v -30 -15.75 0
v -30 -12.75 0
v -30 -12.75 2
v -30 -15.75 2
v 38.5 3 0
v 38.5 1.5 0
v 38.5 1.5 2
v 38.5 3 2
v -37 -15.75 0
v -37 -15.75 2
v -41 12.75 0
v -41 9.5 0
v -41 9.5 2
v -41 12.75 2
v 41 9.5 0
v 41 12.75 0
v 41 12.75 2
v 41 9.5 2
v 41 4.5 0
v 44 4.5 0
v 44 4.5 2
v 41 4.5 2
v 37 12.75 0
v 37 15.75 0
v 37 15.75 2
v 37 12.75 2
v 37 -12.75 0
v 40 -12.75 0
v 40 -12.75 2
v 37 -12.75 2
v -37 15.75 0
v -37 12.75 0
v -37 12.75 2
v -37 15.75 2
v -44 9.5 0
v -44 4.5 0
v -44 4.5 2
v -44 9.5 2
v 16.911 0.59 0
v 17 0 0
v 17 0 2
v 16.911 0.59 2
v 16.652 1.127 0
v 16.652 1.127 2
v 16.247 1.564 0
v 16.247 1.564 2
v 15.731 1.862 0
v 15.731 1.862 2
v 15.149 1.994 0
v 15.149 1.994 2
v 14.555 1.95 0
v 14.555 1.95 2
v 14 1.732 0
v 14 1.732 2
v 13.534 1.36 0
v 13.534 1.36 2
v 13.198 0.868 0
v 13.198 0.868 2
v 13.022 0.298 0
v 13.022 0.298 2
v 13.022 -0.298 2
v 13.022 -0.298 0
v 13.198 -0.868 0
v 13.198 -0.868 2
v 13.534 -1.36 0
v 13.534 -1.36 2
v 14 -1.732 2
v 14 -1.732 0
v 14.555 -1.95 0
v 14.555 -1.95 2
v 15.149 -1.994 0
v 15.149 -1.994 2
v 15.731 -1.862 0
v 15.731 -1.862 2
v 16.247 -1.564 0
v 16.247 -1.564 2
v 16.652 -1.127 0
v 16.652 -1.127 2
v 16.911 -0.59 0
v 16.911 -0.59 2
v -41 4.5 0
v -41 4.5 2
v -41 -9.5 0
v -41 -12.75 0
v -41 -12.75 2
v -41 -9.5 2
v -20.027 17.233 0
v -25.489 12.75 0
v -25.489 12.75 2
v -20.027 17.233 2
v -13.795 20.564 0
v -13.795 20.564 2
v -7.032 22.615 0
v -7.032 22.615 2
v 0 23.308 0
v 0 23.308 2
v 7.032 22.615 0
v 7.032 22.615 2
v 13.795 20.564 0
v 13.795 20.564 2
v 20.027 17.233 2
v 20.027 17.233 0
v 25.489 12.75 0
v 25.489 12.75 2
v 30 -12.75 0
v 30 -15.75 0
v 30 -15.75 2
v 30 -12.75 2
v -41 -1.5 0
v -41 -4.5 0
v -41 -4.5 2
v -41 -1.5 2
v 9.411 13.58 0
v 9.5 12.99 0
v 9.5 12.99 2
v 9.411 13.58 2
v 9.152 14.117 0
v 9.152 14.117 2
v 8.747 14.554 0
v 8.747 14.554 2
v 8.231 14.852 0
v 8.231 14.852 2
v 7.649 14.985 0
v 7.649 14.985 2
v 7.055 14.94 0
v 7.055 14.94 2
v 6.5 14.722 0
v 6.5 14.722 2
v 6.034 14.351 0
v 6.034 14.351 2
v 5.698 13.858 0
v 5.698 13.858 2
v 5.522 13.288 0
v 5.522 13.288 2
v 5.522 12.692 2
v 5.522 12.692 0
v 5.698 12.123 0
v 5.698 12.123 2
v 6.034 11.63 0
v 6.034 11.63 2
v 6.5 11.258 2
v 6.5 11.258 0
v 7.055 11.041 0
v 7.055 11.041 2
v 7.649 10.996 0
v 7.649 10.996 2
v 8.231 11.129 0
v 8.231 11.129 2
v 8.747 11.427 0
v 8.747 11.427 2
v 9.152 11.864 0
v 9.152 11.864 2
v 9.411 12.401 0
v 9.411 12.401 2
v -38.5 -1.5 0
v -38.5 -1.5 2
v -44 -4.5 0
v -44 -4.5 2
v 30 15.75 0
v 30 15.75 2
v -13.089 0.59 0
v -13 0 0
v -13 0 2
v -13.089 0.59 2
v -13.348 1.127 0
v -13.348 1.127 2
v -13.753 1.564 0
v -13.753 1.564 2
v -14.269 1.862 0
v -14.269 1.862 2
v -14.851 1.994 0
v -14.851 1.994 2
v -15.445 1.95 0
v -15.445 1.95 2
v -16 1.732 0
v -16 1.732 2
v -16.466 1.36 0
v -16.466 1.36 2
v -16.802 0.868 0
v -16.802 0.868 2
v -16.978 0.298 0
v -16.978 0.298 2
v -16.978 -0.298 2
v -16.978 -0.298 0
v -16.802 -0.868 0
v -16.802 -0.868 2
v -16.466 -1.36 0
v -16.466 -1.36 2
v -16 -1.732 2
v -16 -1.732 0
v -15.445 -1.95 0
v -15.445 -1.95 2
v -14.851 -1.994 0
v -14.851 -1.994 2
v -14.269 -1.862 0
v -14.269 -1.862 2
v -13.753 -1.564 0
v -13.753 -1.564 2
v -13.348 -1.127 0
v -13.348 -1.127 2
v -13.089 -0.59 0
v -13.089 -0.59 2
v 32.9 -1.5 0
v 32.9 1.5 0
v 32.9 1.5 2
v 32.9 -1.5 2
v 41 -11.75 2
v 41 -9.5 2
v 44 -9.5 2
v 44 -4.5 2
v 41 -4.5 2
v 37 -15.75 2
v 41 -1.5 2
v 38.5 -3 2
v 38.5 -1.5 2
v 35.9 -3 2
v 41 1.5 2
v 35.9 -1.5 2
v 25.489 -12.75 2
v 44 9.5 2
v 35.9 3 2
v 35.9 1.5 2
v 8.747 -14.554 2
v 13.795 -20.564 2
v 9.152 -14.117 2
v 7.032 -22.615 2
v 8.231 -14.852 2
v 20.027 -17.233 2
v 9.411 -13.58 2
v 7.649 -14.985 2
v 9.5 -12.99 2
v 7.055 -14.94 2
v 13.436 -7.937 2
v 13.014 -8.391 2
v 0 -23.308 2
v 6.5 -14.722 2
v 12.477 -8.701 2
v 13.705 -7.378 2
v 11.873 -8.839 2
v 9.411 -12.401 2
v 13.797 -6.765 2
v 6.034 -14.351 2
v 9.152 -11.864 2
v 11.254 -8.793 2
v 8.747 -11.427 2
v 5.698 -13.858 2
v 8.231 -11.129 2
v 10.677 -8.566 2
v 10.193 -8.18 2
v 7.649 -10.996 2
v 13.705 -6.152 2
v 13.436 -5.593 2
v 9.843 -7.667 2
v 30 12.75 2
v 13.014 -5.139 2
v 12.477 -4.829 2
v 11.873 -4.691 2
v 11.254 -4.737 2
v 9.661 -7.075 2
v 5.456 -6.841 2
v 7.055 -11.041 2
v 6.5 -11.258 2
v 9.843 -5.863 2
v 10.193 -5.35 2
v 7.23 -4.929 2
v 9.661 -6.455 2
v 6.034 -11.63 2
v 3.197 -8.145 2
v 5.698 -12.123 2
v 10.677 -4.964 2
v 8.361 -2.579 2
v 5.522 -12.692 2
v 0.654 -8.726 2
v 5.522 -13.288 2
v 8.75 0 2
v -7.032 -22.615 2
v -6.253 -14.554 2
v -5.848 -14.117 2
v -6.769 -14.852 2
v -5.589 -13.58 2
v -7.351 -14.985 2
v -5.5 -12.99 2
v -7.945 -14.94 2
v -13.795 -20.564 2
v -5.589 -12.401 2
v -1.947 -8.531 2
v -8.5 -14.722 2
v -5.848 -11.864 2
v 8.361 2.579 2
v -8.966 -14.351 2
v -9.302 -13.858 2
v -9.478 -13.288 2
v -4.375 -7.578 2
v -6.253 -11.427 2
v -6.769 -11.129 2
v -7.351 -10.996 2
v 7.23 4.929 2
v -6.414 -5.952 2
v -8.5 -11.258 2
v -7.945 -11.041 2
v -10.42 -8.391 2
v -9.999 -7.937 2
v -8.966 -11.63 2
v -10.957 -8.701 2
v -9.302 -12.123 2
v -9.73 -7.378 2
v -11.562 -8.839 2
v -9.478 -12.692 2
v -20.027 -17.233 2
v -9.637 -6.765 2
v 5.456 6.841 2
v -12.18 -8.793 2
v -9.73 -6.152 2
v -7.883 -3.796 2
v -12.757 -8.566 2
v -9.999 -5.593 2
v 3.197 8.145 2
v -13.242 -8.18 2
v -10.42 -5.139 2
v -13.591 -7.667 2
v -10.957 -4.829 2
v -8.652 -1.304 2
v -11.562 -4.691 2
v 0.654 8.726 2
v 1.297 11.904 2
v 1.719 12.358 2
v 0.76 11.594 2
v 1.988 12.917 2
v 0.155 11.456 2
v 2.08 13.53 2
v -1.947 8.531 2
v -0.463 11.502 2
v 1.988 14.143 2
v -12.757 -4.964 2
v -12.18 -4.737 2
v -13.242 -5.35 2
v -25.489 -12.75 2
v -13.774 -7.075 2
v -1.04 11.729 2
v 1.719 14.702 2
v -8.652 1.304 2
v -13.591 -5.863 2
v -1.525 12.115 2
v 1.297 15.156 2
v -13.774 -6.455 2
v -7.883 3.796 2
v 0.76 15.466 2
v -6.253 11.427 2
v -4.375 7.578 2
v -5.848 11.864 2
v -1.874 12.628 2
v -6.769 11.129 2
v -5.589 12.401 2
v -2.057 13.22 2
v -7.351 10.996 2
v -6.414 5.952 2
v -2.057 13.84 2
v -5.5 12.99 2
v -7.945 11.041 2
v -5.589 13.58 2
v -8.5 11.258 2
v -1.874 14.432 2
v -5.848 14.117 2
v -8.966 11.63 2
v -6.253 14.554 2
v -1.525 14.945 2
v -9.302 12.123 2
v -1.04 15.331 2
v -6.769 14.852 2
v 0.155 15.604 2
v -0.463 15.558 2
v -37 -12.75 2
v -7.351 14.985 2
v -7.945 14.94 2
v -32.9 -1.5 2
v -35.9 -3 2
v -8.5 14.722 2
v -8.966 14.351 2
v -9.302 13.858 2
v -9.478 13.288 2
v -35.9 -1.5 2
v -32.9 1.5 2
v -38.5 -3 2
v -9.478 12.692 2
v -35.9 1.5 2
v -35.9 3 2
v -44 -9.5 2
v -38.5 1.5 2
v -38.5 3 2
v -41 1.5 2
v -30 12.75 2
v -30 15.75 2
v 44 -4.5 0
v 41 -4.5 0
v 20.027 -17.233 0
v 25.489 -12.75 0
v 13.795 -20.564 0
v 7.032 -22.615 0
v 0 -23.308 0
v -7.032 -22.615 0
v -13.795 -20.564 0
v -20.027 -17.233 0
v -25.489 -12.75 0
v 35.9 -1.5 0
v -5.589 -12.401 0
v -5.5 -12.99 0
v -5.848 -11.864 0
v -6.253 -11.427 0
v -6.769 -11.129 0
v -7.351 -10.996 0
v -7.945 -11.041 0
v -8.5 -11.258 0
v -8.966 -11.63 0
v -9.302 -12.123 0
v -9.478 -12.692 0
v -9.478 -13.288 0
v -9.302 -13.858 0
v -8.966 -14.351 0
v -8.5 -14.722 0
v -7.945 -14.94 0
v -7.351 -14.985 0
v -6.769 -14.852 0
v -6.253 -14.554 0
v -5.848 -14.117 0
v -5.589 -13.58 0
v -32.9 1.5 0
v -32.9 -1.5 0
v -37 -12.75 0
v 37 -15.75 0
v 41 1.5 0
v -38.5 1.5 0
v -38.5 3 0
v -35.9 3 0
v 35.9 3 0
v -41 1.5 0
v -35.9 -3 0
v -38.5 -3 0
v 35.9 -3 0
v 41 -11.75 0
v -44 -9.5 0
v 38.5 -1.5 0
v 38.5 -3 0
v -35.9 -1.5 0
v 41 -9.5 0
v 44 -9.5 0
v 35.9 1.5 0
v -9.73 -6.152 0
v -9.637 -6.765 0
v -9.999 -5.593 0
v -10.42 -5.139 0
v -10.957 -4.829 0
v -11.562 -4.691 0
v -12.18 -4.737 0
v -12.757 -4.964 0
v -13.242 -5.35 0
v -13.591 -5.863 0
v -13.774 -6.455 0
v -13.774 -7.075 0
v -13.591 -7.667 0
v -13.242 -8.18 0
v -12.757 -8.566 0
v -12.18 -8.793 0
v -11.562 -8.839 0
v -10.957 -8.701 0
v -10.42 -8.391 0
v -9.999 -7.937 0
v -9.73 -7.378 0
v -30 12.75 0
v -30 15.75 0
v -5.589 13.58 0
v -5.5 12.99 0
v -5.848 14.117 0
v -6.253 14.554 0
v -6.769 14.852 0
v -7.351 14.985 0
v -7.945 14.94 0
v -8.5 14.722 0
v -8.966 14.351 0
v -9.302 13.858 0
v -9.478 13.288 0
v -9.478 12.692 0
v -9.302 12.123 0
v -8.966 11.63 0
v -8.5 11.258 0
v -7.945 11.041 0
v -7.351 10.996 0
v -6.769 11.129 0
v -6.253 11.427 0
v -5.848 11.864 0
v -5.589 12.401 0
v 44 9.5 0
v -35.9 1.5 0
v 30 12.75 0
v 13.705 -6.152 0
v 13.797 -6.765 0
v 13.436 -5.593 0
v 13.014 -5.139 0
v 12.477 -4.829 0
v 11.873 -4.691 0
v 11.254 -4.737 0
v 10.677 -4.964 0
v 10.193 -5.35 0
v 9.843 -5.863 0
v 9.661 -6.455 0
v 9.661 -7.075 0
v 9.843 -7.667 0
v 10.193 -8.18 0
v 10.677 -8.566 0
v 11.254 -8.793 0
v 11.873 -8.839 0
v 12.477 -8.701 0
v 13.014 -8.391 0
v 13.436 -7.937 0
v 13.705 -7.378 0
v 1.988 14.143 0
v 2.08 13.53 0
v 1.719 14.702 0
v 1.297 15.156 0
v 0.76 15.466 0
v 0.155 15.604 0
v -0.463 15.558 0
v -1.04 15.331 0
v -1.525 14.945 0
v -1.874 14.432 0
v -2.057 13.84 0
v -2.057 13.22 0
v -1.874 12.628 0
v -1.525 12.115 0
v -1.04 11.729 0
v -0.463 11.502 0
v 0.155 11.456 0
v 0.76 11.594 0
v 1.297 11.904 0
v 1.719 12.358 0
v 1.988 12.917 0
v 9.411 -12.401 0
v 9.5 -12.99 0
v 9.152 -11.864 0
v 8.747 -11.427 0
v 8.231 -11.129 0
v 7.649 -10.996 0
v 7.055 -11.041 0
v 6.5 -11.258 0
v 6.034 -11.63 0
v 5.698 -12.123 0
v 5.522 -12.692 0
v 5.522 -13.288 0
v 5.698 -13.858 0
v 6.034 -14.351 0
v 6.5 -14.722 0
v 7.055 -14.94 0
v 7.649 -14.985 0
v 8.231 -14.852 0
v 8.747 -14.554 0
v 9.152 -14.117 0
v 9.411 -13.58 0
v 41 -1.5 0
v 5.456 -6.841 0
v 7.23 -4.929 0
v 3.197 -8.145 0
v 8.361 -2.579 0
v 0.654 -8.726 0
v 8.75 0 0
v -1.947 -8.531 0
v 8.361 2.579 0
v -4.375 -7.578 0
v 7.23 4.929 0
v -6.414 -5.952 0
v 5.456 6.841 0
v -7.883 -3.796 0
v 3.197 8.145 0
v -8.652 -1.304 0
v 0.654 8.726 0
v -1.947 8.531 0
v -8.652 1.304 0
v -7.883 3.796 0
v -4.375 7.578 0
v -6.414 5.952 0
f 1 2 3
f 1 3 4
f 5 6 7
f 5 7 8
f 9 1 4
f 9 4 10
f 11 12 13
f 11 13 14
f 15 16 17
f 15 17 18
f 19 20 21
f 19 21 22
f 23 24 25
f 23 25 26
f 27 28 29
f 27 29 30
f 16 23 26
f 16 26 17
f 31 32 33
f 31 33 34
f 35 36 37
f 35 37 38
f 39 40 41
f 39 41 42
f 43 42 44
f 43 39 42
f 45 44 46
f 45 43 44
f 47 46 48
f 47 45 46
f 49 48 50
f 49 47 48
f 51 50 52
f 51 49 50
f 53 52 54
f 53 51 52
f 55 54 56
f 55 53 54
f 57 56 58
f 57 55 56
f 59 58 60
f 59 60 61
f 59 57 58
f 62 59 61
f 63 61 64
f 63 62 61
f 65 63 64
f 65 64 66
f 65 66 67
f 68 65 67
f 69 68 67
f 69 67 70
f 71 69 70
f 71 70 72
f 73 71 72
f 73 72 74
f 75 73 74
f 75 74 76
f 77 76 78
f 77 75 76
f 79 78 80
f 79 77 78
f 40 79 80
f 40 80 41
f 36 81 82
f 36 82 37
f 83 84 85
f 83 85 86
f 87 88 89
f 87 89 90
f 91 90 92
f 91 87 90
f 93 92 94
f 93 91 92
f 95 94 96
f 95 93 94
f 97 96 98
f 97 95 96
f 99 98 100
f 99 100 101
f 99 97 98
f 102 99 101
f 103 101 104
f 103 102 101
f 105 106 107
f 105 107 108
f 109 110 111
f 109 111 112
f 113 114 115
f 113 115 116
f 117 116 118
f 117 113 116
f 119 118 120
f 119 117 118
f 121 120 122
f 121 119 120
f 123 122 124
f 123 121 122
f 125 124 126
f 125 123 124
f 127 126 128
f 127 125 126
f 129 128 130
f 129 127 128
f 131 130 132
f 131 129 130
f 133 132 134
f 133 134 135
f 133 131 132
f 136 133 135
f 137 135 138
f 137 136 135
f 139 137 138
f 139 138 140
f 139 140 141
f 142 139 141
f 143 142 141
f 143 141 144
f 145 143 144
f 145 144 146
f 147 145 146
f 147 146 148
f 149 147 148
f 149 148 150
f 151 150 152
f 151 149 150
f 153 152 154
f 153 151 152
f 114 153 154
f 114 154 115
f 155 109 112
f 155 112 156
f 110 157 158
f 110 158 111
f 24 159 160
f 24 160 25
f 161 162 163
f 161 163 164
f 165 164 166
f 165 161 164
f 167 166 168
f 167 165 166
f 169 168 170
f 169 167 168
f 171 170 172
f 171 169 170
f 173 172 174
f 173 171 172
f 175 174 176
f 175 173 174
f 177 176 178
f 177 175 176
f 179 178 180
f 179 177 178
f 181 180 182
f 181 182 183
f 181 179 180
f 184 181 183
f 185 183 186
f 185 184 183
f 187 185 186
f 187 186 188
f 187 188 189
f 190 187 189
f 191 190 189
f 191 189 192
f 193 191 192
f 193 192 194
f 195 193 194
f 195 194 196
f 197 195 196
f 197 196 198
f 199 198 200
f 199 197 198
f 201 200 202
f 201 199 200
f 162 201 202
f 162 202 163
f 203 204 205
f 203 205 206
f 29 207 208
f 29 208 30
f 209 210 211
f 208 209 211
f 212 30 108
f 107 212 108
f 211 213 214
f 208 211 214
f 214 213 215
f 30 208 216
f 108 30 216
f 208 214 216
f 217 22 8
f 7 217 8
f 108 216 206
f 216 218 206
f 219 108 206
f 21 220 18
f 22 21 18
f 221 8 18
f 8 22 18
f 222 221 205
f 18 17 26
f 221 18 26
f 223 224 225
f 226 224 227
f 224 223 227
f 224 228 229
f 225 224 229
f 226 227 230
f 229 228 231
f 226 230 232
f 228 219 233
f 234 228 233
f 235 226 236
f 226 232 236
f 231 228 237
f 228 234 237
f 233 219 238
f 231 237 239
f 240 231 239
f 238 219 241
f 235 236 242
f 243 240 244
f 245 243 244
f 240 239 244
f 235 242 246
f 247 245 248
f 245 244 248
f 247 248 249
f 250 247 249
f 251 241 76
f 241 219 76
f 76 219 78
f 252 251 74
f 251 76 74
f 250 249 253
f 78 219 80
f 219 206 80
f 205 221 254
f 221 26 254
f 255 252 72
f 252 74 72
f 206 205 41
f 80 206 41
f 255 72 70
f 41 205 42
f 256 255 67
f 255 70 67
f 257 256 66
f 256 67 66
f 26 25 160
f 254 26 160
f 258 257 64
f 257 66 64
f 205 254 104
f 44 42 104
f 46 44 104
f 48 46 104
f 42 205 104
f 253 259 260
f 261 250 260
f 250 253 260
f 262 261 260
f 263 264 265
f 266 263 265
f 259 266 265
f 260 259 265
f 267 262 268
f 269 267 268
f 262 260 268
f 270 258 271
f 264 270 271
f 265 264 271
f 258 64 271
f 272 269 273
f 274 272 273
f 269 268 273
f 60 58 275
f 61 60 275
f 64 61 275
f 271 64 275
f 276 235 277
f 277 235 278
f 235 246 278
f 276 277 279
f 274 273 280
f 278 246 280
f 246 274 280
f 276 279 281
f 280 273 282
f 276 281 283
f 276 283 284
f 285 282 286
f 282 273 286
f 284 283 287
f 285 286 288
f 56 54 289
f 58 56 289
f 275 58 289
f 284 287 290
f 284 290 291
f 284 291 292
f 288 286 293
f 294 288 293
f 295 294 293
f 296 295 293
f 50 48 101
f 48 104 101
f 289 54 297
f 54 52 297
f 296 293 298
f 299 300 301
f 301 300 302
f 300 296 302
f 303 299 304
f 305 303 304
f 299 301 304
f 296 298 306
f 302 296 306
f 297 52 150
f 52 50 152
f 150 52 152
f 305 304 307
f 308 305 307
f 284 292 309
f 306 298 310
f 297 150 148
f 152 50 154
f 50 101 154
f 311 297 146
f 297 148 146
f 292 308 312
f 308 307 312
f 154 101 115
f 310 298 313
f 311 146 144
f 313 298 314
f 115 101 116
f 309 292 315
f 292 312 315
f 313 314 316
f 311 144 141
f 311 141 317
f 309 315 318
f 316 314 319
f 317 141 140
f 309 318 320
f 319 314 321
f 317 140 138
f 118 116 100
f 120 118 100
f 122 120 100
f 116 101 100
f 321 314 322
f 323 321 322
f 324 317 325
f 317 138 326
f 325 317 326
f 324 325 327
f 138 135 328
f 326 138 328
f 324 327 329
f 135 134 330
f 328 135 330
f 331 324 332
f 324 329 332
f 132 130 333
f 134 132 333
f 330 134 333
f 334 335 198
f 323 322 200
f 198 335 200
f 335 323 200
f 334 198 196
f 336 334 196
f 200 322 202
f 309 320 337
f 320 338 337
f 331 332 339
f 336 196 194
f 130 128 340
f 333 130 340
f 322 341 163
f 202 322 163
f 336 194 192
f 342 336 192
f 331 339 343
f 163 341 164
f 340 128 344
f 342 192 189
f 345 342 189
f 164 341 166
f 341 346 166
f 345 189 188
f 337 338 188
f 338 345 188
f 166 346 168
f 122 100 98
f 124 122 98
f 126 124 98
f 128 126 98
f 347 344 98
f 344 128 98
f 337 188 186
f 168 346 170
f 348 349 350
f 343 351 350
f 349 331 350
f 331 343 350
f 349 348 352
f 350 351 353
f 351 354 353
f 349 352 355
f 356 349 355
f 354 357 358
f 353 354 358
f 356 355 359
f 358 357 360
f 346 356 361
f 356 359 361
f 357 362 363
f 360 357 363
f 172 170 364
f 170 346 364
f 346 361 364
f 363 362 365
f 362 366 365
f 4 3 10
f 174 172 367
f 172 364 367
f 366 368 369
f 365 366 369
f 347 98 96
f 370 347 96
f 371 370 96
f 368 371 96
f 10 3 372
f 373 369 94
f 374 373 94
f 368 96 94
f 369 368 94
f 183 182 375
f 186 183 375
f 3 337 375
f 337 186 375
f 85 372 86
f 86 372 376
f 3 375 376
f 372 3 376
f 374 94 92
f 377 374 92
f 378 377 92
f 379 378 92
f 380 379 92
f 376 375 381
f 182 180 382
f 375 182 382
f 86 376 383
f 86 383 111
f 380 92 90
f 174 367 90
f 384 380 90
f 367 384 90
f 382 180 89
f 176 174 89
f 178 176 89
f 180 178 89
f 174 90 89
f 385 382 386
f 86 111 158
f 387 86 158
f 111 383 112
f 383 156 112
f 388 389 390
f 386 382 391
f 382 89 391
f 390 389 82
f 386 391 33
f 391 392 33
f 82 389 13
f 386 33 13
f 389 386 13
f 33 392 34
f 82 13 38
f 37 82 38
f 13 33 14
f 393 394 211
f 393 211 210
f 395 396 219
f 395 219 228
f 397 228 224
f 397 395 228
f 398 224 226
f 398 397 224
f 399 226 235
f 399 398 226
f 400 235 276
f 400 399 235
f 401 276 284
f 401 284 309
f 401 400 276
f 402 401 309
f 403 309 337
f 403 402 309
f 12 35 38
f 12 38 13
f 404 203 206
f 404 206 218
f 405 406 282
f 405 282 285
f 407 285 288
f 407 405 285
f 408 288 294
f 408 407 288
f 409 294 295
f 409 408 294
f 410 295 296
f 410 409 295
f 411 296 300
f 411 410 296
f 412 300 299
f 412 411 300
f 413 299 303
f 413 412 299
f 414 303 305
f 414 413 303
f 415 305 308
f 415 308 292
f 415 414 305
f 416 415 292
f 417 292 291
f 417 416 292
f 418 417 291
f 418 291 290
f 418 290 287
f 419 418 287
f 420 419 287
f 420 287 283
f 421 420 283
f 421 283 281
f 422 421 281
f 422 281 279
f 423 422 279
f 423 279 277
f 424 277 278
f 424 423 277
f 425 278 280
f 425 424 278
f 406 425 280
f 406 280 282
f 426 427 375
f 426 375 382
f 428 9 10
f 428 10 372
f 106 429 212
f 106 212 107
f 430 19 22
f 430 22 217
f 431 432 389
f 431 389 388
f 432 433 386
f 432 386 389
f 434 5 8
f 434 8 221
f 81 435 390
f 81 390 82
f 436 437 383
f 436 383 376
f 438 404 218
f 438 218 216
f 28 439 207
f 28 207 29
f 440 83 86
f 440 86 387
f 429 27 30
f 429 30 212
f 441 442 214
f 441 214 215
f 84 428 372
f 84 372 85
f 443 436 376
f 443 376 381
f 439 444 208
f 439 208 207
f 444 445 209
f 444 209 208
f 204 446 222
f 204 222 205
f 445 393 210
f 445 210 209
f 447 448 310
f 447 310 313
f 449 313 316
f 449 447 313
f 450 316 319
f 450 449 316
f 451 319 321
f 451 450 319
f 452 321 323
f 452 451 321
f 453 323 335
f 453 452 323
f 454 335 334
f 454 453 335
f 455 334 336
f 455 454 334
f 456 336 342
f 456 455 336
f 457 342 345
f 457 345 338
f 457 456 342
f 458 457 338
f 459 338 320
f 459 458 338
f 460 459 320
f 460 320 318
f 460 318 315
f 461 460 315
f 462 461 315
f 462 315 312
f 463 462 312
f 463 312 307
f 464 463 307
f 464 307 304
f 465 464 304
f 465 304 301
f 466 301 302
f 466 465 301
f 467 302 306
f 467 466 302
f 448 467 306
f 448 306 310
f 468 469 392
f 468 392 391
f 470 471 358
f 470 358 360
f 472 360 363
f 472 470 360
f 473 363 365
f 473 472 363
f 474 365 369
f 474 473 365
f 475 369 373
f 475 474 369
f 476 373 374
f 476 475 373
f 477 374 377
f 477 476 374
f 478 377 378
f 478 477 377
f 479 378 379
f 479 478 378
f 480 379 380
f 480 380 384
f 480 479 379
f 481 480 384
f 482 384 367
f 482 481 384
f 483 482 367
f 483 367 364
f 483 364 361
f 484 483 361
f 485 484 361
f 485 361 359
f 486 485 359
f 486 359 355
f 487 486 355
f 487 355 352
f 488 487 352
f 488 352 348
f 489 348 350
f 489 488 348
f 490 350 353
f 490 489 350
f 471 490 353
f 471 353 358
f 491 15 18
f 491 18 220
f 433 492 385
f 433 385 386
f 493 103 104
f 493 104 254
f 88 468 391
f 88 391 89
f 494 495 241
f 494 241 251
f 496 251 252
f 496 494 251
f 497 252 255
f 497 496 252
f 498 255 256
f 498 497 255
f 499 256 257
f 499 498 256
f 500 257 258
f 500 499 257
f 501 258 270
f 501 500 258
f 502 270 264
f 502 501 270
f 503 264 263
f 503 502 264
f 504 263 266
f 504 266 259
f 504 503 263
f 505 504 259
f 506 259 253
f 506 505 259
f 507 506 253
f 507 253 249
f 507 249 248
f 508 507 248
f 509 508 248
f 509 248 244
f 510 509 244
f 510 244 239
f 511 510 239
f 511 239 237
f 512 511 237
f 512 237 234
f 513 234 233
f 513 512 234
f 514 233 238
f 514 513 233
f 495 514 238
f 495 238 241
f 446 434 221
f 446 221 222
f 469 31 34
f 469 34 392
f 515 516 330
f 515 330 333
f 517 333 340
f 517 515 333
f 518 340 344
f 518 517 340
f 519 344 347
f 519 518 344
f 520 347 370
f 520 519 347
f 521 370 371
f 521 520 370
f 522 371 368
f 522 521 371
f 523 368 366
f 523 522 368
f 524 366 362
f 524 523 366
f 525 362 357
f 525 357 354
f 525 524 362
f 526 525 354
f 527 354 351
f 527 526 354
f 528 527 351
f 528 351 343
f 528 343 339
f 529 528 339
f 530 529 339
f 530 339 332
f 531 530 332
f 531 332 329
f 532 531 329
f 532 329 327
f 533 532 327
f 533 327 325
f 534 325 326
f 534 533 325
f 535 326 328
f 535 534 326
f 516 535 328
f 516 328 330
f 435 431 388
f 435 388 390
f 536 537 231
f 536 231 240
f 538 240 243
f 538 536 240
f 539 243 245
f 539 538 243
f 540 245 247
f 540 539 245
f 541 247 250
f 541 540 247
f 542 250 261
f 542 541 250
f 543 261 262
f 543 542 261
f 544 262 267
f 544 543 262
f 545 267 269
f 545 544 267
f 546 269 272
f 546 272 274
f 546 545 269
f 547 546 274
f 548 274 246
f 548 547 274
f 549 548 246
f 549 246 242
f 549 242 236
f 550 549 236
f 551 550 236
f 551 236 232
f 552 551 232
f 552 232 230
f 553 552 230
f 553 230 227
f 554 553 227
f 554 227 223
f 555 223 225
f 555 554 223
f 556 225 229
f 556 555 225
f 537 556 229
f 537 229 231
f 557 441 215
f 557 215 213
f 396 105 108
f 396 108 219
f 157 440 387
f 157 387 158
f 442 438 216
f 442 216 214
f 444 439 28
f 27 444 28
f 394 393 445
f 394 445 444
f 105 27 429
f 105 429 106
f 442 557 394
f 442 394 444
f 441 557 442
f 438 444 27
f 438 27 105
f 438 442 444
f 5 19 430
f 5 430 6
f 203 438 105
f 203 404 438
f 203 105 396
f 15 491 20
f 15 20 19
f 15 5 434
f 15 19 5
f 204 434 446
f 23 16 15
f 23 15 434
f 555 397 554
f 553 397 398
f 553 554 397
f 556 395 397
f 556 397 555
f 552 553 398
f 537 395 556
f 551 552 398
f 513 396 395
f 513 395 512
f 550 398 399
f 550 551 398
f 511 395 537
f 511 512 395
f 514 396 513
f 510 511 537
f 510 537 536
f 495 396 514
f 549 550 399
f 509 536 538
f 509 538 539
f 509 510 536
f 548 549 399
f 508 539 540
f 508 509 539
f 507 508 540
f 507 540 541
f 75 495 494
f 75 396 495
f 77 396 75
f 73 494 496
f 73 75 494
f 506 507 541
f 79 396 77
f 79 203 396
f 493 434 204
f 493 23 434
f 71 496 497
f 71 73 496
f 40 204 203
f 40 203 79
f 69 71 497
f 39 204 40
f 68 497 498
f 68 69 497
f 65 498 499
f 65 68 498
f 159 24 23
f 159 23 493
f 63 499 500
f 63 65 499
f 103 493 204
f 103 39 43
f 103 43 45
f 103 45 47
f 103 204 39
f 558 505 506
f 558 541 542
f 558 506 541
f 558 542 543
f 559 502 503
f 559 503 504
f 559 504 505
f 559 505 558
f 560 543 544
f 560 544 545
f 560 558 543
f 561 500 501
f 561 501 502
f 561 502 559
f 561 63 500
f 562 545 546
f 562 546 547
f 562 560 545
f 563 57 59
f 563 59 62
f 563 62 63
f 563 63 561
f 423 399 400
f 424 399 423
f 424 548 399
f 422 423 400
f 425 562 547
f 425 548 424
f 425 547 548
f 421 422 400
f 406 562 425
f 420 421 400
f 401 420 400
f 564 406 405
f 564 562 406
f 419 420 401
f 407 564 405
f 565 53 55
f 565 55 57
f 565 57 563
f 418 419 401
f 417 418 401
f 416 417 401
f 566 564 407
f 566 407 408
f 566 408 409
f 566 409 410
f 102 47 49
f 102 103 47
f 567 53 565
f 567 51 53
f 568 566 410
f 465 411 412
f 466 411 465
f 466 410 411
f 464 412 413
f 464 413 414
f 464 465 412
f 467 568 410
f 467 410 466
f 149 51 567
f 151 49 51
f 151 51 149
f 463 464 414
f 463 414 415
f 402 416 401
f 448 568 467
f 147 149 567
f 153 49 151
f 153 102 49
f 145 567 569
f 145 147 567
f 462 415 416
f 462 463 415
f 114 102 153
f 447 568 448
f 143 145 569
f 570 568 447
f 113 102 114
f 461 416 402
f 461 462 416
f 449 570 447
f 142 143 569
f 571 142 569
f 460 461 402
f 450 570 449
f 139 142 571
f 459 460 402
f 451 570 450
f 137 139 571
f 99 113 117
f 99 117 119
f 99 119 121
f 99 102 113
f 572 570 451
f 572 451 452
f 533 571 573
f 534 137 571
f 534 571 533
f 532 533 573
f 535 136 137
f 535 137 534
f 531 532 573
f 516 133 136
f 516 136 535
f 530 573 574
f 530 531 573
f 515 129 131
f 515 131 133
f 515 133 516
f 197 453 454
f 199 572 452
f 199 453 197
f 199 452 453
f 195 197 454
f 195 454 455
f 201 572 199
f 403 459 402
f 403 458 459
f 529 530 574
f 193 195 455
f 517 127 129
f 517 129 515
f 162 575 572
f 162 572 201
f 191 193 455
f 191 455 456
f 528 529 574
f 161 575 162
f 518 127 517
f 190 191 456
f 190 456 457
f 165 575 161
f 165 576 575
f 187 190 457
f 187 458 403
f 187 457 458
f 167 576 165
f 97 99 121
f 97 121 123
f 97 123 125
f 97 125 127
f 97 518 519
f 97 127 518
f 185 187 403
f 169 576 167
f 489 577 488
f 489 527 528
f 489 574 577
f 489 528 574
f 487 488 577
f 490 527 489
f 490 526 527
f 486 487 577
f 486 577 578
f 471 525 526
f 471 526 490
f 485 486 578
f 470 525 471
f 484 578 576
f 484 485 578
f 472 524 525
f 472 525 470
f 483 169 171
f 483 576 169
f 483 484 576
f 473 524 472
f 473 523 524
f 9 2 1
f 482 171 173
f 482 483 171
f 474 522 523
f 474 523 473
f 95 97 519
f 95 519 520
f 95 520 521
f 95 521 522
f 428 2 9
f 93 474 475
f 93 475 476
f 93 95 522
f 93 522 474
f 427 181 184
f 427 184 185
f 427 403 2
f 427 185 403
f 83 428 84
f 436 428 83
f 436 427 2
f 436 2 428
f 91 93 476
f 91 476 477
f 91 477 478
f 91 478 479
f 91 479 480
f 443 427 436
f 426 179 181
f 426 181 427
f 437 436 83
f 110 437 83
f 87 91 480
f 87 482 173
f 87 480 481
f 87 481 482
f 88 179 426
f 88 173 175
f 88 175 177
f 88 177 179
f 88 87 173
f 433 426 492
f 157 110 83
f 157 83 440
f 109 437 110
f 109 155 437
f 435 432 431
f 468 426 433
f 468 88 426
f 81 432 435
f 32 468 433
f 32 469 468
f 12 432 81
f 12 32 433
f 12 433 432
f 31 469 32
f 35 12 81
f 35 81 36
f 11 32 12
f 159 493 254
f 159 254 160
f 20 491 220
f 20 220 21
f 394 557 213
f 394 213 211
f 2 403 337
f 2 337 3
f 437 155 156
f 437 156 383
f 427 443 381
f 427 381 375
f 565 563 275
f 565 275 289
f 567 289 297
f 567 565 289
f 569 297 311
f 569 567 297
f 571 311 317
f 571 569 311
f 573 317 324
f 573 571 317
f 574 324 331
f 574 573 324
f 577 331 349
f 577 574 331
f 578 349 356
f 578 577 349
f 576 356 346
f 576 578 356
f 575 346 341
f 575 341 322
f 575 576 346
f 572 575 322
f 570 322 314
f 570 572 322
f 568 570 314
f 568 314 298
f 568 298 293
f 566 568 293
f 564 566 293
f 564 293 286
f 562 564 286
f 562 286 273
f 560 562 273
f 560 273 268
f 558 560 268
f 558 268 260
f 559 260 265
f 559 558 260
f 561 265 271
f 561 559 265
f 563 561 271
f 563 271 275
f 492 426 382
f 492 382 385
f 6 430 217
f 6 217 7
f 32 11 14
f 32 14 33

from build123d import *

# Parameters (mm, degrees)
SKETCH_1_R      = 2
SKETCH_1_R_2    = 2.08
SKETCH_1_R_3    = 8.75
EXTRUDE_2_DEPTH = 2


with BuildPart() as part:
    # 草图1 → 凸台-拉伸2 (new body)
    with BuildSketch(Plane.XY):
        with BuildLine():
            Line((-30, 12.75), (-25.488968202, 12.75))
            ThreePointArc((-25.488968202, 12.75), (0, 23.30787632), (25.488968202, 12.75))
            Line((25.488968202, 12.75), (30, 12.75))
            Line((30, 12.75), (30, 15.75))
            Line((30, 15.75), (37, 15.75))
            Line((37, 15.75), (37, 12.75))
            Line((37, 12.75), (41, 12.75))
            Line((41, 12.75), (41, 9.5))
            Line((41, 9.5), (44, 9.5))
            Line((44, 9.5), (44, 4.5))
            Line((44, 4.5), (41, 4.5))
            Line((41, 4.5), (41, 1.5))
            Line((41, 1.5), (38.5, 1.5))
            Line((38.5, 1.5), (38.5, 3))
            Line((38.5, 3), (35.9, 3))
            Line((35.9, 3), (35.9, 1.5))
            Line((35.9, 1.5), (32.9, 1.5))
            Line((32.9, 1.5), (32.9, -1.5))
            Line((32.9, -1.5), (35.9, -1.5))
            Line((35.9, -1.5), (35.9, -3))
            Line((35.9, -3), (38.5, -3))
            Line((38.5, -3), (38.5, -1.5))
            Line((38.5, -1.5), (41, -1.5))
            Line((41, -1.5), (41, -4.5))
            Line((41, -4.5), (44, -4.5))
            Line((44, -4.5), (44, -9.5))
            Line((44, -9.5), (41, -9.5))
            Line((41, -9.5), (41, -11.75))
            Line((41, -11.75), (40, -12.75))
            Line((40, -12.75), (37, -12.75))
            Line((37, -12.75), (37, -15.75))
            Line((37, -15.75), (30, -15.75))
            Line((30, -15.75), (30, -12.75))
            Line((30, -12.75), (25.488968202, -12.75))
            ThreePointArc((25.488968202, -12.75), (0, -23.30787632), (-25.488968202, -12.75))
            Line((-25.488968202, -12.75), (-30, -12.75))
            Line((-30, -12.75), (-30, -15.75))
            Line((-30, -15.75), (-37, -15.75))
            Line((-37, -15.75), (-37, -12.75))
            Line((-37, -12.75), (-41, -12.75))
            Line((-41, -12.75), (-41, -9.5))
            Line((-41, -9.5), (-44, -9.5))
            Line((-44, -9.5), (-44, -4.5))
            Line((-44, -4.5), (-41, -4.5))
            Line((-41, -4.5), (-41, -1.5))
            Line((-41, -1.5), (-38.5, -1.5))
            Line((-38.5, -1.5), (-38.5, -3))
            Line((-38.5, -3), (-35.9, -3))
            Line((-35.9, -3), (-35.9, -1.5))
            Line((-35.9, -1.5), (-32.9, -1.5))
            Line((-32.9, -1.5), (-32.9, 1.5))
            Line((-32.9, 1.5), (-35.9, 1.5))
            Line((-35.9, 1.5), (-35.9, 3))
            Line((-35.9, 3), (-38.5, 3))
            Line((-38.5, 3), (-38.5, 1.5))
            Line((-38.5, 1.5), (-41, 1.5))
            Line((-41, 1.5), (-41, 4.5))
            Line((-41, 4.5), (-44, 4.5))
            Line((-44, 4.5), (-44, 9.5))
            Line((-44, 9.5), (-41, 9.5))
            Line((-41, 9.5), (-41, 12.75))
            Line((-41, 12.75), (-37, 12.75))
            Line((-37, 12.75), (-37, 15.75))
            Line((-37, 15.75), (-30, 15.75))
            Line((-30, 15.75), (-30, 12.75))
        make_face()
        with Locations((-15, 0)):
            Circle(SKETCH_1_R, mode=Mode.SUBTRACT)
        with Locations((-7.5, 12.990381057)):
            Circle(SKETCH_1_R, mode=Mode.SUBTRACT)
        with Locations((7.5, 12.990381057)):
            Circle(SKETCH_1_R, mode=Mode.SUBTRACT)
        with Locations((15, 0)):
            Circle(SKETCH_1_R, mode=Mode.SUBTRACT)
        with Locations((7.5, -12.990381057)):
            Circle(SKETCH_1_R, mode=Mode.SUBTRACT)
        with Locations((-7.5, -12.990381057)):
            Circle(SKETCH_1_R, mode=Mode.SUBTRACT)
        with Locations((0, 13.53)):
            Circle(SKETCH_1_R_2, mode=Mode.SUBTRACT)
        with Locations((11.717323713, -6.765)):
            Circle(SKETCH_1_R_2, mode=Mode.SUBTRACT)
        with Locations((-11.717323713, -6.765)):
            Circle(SKETCH_1_R_2, mode=Mode.SUBTRACT)
        Circle(SKETCH_1_R_3, mode=Mode.SUBTRACT)
    extrude(amount=EXTRUDE_2_DEPTH)


solid = part.part
